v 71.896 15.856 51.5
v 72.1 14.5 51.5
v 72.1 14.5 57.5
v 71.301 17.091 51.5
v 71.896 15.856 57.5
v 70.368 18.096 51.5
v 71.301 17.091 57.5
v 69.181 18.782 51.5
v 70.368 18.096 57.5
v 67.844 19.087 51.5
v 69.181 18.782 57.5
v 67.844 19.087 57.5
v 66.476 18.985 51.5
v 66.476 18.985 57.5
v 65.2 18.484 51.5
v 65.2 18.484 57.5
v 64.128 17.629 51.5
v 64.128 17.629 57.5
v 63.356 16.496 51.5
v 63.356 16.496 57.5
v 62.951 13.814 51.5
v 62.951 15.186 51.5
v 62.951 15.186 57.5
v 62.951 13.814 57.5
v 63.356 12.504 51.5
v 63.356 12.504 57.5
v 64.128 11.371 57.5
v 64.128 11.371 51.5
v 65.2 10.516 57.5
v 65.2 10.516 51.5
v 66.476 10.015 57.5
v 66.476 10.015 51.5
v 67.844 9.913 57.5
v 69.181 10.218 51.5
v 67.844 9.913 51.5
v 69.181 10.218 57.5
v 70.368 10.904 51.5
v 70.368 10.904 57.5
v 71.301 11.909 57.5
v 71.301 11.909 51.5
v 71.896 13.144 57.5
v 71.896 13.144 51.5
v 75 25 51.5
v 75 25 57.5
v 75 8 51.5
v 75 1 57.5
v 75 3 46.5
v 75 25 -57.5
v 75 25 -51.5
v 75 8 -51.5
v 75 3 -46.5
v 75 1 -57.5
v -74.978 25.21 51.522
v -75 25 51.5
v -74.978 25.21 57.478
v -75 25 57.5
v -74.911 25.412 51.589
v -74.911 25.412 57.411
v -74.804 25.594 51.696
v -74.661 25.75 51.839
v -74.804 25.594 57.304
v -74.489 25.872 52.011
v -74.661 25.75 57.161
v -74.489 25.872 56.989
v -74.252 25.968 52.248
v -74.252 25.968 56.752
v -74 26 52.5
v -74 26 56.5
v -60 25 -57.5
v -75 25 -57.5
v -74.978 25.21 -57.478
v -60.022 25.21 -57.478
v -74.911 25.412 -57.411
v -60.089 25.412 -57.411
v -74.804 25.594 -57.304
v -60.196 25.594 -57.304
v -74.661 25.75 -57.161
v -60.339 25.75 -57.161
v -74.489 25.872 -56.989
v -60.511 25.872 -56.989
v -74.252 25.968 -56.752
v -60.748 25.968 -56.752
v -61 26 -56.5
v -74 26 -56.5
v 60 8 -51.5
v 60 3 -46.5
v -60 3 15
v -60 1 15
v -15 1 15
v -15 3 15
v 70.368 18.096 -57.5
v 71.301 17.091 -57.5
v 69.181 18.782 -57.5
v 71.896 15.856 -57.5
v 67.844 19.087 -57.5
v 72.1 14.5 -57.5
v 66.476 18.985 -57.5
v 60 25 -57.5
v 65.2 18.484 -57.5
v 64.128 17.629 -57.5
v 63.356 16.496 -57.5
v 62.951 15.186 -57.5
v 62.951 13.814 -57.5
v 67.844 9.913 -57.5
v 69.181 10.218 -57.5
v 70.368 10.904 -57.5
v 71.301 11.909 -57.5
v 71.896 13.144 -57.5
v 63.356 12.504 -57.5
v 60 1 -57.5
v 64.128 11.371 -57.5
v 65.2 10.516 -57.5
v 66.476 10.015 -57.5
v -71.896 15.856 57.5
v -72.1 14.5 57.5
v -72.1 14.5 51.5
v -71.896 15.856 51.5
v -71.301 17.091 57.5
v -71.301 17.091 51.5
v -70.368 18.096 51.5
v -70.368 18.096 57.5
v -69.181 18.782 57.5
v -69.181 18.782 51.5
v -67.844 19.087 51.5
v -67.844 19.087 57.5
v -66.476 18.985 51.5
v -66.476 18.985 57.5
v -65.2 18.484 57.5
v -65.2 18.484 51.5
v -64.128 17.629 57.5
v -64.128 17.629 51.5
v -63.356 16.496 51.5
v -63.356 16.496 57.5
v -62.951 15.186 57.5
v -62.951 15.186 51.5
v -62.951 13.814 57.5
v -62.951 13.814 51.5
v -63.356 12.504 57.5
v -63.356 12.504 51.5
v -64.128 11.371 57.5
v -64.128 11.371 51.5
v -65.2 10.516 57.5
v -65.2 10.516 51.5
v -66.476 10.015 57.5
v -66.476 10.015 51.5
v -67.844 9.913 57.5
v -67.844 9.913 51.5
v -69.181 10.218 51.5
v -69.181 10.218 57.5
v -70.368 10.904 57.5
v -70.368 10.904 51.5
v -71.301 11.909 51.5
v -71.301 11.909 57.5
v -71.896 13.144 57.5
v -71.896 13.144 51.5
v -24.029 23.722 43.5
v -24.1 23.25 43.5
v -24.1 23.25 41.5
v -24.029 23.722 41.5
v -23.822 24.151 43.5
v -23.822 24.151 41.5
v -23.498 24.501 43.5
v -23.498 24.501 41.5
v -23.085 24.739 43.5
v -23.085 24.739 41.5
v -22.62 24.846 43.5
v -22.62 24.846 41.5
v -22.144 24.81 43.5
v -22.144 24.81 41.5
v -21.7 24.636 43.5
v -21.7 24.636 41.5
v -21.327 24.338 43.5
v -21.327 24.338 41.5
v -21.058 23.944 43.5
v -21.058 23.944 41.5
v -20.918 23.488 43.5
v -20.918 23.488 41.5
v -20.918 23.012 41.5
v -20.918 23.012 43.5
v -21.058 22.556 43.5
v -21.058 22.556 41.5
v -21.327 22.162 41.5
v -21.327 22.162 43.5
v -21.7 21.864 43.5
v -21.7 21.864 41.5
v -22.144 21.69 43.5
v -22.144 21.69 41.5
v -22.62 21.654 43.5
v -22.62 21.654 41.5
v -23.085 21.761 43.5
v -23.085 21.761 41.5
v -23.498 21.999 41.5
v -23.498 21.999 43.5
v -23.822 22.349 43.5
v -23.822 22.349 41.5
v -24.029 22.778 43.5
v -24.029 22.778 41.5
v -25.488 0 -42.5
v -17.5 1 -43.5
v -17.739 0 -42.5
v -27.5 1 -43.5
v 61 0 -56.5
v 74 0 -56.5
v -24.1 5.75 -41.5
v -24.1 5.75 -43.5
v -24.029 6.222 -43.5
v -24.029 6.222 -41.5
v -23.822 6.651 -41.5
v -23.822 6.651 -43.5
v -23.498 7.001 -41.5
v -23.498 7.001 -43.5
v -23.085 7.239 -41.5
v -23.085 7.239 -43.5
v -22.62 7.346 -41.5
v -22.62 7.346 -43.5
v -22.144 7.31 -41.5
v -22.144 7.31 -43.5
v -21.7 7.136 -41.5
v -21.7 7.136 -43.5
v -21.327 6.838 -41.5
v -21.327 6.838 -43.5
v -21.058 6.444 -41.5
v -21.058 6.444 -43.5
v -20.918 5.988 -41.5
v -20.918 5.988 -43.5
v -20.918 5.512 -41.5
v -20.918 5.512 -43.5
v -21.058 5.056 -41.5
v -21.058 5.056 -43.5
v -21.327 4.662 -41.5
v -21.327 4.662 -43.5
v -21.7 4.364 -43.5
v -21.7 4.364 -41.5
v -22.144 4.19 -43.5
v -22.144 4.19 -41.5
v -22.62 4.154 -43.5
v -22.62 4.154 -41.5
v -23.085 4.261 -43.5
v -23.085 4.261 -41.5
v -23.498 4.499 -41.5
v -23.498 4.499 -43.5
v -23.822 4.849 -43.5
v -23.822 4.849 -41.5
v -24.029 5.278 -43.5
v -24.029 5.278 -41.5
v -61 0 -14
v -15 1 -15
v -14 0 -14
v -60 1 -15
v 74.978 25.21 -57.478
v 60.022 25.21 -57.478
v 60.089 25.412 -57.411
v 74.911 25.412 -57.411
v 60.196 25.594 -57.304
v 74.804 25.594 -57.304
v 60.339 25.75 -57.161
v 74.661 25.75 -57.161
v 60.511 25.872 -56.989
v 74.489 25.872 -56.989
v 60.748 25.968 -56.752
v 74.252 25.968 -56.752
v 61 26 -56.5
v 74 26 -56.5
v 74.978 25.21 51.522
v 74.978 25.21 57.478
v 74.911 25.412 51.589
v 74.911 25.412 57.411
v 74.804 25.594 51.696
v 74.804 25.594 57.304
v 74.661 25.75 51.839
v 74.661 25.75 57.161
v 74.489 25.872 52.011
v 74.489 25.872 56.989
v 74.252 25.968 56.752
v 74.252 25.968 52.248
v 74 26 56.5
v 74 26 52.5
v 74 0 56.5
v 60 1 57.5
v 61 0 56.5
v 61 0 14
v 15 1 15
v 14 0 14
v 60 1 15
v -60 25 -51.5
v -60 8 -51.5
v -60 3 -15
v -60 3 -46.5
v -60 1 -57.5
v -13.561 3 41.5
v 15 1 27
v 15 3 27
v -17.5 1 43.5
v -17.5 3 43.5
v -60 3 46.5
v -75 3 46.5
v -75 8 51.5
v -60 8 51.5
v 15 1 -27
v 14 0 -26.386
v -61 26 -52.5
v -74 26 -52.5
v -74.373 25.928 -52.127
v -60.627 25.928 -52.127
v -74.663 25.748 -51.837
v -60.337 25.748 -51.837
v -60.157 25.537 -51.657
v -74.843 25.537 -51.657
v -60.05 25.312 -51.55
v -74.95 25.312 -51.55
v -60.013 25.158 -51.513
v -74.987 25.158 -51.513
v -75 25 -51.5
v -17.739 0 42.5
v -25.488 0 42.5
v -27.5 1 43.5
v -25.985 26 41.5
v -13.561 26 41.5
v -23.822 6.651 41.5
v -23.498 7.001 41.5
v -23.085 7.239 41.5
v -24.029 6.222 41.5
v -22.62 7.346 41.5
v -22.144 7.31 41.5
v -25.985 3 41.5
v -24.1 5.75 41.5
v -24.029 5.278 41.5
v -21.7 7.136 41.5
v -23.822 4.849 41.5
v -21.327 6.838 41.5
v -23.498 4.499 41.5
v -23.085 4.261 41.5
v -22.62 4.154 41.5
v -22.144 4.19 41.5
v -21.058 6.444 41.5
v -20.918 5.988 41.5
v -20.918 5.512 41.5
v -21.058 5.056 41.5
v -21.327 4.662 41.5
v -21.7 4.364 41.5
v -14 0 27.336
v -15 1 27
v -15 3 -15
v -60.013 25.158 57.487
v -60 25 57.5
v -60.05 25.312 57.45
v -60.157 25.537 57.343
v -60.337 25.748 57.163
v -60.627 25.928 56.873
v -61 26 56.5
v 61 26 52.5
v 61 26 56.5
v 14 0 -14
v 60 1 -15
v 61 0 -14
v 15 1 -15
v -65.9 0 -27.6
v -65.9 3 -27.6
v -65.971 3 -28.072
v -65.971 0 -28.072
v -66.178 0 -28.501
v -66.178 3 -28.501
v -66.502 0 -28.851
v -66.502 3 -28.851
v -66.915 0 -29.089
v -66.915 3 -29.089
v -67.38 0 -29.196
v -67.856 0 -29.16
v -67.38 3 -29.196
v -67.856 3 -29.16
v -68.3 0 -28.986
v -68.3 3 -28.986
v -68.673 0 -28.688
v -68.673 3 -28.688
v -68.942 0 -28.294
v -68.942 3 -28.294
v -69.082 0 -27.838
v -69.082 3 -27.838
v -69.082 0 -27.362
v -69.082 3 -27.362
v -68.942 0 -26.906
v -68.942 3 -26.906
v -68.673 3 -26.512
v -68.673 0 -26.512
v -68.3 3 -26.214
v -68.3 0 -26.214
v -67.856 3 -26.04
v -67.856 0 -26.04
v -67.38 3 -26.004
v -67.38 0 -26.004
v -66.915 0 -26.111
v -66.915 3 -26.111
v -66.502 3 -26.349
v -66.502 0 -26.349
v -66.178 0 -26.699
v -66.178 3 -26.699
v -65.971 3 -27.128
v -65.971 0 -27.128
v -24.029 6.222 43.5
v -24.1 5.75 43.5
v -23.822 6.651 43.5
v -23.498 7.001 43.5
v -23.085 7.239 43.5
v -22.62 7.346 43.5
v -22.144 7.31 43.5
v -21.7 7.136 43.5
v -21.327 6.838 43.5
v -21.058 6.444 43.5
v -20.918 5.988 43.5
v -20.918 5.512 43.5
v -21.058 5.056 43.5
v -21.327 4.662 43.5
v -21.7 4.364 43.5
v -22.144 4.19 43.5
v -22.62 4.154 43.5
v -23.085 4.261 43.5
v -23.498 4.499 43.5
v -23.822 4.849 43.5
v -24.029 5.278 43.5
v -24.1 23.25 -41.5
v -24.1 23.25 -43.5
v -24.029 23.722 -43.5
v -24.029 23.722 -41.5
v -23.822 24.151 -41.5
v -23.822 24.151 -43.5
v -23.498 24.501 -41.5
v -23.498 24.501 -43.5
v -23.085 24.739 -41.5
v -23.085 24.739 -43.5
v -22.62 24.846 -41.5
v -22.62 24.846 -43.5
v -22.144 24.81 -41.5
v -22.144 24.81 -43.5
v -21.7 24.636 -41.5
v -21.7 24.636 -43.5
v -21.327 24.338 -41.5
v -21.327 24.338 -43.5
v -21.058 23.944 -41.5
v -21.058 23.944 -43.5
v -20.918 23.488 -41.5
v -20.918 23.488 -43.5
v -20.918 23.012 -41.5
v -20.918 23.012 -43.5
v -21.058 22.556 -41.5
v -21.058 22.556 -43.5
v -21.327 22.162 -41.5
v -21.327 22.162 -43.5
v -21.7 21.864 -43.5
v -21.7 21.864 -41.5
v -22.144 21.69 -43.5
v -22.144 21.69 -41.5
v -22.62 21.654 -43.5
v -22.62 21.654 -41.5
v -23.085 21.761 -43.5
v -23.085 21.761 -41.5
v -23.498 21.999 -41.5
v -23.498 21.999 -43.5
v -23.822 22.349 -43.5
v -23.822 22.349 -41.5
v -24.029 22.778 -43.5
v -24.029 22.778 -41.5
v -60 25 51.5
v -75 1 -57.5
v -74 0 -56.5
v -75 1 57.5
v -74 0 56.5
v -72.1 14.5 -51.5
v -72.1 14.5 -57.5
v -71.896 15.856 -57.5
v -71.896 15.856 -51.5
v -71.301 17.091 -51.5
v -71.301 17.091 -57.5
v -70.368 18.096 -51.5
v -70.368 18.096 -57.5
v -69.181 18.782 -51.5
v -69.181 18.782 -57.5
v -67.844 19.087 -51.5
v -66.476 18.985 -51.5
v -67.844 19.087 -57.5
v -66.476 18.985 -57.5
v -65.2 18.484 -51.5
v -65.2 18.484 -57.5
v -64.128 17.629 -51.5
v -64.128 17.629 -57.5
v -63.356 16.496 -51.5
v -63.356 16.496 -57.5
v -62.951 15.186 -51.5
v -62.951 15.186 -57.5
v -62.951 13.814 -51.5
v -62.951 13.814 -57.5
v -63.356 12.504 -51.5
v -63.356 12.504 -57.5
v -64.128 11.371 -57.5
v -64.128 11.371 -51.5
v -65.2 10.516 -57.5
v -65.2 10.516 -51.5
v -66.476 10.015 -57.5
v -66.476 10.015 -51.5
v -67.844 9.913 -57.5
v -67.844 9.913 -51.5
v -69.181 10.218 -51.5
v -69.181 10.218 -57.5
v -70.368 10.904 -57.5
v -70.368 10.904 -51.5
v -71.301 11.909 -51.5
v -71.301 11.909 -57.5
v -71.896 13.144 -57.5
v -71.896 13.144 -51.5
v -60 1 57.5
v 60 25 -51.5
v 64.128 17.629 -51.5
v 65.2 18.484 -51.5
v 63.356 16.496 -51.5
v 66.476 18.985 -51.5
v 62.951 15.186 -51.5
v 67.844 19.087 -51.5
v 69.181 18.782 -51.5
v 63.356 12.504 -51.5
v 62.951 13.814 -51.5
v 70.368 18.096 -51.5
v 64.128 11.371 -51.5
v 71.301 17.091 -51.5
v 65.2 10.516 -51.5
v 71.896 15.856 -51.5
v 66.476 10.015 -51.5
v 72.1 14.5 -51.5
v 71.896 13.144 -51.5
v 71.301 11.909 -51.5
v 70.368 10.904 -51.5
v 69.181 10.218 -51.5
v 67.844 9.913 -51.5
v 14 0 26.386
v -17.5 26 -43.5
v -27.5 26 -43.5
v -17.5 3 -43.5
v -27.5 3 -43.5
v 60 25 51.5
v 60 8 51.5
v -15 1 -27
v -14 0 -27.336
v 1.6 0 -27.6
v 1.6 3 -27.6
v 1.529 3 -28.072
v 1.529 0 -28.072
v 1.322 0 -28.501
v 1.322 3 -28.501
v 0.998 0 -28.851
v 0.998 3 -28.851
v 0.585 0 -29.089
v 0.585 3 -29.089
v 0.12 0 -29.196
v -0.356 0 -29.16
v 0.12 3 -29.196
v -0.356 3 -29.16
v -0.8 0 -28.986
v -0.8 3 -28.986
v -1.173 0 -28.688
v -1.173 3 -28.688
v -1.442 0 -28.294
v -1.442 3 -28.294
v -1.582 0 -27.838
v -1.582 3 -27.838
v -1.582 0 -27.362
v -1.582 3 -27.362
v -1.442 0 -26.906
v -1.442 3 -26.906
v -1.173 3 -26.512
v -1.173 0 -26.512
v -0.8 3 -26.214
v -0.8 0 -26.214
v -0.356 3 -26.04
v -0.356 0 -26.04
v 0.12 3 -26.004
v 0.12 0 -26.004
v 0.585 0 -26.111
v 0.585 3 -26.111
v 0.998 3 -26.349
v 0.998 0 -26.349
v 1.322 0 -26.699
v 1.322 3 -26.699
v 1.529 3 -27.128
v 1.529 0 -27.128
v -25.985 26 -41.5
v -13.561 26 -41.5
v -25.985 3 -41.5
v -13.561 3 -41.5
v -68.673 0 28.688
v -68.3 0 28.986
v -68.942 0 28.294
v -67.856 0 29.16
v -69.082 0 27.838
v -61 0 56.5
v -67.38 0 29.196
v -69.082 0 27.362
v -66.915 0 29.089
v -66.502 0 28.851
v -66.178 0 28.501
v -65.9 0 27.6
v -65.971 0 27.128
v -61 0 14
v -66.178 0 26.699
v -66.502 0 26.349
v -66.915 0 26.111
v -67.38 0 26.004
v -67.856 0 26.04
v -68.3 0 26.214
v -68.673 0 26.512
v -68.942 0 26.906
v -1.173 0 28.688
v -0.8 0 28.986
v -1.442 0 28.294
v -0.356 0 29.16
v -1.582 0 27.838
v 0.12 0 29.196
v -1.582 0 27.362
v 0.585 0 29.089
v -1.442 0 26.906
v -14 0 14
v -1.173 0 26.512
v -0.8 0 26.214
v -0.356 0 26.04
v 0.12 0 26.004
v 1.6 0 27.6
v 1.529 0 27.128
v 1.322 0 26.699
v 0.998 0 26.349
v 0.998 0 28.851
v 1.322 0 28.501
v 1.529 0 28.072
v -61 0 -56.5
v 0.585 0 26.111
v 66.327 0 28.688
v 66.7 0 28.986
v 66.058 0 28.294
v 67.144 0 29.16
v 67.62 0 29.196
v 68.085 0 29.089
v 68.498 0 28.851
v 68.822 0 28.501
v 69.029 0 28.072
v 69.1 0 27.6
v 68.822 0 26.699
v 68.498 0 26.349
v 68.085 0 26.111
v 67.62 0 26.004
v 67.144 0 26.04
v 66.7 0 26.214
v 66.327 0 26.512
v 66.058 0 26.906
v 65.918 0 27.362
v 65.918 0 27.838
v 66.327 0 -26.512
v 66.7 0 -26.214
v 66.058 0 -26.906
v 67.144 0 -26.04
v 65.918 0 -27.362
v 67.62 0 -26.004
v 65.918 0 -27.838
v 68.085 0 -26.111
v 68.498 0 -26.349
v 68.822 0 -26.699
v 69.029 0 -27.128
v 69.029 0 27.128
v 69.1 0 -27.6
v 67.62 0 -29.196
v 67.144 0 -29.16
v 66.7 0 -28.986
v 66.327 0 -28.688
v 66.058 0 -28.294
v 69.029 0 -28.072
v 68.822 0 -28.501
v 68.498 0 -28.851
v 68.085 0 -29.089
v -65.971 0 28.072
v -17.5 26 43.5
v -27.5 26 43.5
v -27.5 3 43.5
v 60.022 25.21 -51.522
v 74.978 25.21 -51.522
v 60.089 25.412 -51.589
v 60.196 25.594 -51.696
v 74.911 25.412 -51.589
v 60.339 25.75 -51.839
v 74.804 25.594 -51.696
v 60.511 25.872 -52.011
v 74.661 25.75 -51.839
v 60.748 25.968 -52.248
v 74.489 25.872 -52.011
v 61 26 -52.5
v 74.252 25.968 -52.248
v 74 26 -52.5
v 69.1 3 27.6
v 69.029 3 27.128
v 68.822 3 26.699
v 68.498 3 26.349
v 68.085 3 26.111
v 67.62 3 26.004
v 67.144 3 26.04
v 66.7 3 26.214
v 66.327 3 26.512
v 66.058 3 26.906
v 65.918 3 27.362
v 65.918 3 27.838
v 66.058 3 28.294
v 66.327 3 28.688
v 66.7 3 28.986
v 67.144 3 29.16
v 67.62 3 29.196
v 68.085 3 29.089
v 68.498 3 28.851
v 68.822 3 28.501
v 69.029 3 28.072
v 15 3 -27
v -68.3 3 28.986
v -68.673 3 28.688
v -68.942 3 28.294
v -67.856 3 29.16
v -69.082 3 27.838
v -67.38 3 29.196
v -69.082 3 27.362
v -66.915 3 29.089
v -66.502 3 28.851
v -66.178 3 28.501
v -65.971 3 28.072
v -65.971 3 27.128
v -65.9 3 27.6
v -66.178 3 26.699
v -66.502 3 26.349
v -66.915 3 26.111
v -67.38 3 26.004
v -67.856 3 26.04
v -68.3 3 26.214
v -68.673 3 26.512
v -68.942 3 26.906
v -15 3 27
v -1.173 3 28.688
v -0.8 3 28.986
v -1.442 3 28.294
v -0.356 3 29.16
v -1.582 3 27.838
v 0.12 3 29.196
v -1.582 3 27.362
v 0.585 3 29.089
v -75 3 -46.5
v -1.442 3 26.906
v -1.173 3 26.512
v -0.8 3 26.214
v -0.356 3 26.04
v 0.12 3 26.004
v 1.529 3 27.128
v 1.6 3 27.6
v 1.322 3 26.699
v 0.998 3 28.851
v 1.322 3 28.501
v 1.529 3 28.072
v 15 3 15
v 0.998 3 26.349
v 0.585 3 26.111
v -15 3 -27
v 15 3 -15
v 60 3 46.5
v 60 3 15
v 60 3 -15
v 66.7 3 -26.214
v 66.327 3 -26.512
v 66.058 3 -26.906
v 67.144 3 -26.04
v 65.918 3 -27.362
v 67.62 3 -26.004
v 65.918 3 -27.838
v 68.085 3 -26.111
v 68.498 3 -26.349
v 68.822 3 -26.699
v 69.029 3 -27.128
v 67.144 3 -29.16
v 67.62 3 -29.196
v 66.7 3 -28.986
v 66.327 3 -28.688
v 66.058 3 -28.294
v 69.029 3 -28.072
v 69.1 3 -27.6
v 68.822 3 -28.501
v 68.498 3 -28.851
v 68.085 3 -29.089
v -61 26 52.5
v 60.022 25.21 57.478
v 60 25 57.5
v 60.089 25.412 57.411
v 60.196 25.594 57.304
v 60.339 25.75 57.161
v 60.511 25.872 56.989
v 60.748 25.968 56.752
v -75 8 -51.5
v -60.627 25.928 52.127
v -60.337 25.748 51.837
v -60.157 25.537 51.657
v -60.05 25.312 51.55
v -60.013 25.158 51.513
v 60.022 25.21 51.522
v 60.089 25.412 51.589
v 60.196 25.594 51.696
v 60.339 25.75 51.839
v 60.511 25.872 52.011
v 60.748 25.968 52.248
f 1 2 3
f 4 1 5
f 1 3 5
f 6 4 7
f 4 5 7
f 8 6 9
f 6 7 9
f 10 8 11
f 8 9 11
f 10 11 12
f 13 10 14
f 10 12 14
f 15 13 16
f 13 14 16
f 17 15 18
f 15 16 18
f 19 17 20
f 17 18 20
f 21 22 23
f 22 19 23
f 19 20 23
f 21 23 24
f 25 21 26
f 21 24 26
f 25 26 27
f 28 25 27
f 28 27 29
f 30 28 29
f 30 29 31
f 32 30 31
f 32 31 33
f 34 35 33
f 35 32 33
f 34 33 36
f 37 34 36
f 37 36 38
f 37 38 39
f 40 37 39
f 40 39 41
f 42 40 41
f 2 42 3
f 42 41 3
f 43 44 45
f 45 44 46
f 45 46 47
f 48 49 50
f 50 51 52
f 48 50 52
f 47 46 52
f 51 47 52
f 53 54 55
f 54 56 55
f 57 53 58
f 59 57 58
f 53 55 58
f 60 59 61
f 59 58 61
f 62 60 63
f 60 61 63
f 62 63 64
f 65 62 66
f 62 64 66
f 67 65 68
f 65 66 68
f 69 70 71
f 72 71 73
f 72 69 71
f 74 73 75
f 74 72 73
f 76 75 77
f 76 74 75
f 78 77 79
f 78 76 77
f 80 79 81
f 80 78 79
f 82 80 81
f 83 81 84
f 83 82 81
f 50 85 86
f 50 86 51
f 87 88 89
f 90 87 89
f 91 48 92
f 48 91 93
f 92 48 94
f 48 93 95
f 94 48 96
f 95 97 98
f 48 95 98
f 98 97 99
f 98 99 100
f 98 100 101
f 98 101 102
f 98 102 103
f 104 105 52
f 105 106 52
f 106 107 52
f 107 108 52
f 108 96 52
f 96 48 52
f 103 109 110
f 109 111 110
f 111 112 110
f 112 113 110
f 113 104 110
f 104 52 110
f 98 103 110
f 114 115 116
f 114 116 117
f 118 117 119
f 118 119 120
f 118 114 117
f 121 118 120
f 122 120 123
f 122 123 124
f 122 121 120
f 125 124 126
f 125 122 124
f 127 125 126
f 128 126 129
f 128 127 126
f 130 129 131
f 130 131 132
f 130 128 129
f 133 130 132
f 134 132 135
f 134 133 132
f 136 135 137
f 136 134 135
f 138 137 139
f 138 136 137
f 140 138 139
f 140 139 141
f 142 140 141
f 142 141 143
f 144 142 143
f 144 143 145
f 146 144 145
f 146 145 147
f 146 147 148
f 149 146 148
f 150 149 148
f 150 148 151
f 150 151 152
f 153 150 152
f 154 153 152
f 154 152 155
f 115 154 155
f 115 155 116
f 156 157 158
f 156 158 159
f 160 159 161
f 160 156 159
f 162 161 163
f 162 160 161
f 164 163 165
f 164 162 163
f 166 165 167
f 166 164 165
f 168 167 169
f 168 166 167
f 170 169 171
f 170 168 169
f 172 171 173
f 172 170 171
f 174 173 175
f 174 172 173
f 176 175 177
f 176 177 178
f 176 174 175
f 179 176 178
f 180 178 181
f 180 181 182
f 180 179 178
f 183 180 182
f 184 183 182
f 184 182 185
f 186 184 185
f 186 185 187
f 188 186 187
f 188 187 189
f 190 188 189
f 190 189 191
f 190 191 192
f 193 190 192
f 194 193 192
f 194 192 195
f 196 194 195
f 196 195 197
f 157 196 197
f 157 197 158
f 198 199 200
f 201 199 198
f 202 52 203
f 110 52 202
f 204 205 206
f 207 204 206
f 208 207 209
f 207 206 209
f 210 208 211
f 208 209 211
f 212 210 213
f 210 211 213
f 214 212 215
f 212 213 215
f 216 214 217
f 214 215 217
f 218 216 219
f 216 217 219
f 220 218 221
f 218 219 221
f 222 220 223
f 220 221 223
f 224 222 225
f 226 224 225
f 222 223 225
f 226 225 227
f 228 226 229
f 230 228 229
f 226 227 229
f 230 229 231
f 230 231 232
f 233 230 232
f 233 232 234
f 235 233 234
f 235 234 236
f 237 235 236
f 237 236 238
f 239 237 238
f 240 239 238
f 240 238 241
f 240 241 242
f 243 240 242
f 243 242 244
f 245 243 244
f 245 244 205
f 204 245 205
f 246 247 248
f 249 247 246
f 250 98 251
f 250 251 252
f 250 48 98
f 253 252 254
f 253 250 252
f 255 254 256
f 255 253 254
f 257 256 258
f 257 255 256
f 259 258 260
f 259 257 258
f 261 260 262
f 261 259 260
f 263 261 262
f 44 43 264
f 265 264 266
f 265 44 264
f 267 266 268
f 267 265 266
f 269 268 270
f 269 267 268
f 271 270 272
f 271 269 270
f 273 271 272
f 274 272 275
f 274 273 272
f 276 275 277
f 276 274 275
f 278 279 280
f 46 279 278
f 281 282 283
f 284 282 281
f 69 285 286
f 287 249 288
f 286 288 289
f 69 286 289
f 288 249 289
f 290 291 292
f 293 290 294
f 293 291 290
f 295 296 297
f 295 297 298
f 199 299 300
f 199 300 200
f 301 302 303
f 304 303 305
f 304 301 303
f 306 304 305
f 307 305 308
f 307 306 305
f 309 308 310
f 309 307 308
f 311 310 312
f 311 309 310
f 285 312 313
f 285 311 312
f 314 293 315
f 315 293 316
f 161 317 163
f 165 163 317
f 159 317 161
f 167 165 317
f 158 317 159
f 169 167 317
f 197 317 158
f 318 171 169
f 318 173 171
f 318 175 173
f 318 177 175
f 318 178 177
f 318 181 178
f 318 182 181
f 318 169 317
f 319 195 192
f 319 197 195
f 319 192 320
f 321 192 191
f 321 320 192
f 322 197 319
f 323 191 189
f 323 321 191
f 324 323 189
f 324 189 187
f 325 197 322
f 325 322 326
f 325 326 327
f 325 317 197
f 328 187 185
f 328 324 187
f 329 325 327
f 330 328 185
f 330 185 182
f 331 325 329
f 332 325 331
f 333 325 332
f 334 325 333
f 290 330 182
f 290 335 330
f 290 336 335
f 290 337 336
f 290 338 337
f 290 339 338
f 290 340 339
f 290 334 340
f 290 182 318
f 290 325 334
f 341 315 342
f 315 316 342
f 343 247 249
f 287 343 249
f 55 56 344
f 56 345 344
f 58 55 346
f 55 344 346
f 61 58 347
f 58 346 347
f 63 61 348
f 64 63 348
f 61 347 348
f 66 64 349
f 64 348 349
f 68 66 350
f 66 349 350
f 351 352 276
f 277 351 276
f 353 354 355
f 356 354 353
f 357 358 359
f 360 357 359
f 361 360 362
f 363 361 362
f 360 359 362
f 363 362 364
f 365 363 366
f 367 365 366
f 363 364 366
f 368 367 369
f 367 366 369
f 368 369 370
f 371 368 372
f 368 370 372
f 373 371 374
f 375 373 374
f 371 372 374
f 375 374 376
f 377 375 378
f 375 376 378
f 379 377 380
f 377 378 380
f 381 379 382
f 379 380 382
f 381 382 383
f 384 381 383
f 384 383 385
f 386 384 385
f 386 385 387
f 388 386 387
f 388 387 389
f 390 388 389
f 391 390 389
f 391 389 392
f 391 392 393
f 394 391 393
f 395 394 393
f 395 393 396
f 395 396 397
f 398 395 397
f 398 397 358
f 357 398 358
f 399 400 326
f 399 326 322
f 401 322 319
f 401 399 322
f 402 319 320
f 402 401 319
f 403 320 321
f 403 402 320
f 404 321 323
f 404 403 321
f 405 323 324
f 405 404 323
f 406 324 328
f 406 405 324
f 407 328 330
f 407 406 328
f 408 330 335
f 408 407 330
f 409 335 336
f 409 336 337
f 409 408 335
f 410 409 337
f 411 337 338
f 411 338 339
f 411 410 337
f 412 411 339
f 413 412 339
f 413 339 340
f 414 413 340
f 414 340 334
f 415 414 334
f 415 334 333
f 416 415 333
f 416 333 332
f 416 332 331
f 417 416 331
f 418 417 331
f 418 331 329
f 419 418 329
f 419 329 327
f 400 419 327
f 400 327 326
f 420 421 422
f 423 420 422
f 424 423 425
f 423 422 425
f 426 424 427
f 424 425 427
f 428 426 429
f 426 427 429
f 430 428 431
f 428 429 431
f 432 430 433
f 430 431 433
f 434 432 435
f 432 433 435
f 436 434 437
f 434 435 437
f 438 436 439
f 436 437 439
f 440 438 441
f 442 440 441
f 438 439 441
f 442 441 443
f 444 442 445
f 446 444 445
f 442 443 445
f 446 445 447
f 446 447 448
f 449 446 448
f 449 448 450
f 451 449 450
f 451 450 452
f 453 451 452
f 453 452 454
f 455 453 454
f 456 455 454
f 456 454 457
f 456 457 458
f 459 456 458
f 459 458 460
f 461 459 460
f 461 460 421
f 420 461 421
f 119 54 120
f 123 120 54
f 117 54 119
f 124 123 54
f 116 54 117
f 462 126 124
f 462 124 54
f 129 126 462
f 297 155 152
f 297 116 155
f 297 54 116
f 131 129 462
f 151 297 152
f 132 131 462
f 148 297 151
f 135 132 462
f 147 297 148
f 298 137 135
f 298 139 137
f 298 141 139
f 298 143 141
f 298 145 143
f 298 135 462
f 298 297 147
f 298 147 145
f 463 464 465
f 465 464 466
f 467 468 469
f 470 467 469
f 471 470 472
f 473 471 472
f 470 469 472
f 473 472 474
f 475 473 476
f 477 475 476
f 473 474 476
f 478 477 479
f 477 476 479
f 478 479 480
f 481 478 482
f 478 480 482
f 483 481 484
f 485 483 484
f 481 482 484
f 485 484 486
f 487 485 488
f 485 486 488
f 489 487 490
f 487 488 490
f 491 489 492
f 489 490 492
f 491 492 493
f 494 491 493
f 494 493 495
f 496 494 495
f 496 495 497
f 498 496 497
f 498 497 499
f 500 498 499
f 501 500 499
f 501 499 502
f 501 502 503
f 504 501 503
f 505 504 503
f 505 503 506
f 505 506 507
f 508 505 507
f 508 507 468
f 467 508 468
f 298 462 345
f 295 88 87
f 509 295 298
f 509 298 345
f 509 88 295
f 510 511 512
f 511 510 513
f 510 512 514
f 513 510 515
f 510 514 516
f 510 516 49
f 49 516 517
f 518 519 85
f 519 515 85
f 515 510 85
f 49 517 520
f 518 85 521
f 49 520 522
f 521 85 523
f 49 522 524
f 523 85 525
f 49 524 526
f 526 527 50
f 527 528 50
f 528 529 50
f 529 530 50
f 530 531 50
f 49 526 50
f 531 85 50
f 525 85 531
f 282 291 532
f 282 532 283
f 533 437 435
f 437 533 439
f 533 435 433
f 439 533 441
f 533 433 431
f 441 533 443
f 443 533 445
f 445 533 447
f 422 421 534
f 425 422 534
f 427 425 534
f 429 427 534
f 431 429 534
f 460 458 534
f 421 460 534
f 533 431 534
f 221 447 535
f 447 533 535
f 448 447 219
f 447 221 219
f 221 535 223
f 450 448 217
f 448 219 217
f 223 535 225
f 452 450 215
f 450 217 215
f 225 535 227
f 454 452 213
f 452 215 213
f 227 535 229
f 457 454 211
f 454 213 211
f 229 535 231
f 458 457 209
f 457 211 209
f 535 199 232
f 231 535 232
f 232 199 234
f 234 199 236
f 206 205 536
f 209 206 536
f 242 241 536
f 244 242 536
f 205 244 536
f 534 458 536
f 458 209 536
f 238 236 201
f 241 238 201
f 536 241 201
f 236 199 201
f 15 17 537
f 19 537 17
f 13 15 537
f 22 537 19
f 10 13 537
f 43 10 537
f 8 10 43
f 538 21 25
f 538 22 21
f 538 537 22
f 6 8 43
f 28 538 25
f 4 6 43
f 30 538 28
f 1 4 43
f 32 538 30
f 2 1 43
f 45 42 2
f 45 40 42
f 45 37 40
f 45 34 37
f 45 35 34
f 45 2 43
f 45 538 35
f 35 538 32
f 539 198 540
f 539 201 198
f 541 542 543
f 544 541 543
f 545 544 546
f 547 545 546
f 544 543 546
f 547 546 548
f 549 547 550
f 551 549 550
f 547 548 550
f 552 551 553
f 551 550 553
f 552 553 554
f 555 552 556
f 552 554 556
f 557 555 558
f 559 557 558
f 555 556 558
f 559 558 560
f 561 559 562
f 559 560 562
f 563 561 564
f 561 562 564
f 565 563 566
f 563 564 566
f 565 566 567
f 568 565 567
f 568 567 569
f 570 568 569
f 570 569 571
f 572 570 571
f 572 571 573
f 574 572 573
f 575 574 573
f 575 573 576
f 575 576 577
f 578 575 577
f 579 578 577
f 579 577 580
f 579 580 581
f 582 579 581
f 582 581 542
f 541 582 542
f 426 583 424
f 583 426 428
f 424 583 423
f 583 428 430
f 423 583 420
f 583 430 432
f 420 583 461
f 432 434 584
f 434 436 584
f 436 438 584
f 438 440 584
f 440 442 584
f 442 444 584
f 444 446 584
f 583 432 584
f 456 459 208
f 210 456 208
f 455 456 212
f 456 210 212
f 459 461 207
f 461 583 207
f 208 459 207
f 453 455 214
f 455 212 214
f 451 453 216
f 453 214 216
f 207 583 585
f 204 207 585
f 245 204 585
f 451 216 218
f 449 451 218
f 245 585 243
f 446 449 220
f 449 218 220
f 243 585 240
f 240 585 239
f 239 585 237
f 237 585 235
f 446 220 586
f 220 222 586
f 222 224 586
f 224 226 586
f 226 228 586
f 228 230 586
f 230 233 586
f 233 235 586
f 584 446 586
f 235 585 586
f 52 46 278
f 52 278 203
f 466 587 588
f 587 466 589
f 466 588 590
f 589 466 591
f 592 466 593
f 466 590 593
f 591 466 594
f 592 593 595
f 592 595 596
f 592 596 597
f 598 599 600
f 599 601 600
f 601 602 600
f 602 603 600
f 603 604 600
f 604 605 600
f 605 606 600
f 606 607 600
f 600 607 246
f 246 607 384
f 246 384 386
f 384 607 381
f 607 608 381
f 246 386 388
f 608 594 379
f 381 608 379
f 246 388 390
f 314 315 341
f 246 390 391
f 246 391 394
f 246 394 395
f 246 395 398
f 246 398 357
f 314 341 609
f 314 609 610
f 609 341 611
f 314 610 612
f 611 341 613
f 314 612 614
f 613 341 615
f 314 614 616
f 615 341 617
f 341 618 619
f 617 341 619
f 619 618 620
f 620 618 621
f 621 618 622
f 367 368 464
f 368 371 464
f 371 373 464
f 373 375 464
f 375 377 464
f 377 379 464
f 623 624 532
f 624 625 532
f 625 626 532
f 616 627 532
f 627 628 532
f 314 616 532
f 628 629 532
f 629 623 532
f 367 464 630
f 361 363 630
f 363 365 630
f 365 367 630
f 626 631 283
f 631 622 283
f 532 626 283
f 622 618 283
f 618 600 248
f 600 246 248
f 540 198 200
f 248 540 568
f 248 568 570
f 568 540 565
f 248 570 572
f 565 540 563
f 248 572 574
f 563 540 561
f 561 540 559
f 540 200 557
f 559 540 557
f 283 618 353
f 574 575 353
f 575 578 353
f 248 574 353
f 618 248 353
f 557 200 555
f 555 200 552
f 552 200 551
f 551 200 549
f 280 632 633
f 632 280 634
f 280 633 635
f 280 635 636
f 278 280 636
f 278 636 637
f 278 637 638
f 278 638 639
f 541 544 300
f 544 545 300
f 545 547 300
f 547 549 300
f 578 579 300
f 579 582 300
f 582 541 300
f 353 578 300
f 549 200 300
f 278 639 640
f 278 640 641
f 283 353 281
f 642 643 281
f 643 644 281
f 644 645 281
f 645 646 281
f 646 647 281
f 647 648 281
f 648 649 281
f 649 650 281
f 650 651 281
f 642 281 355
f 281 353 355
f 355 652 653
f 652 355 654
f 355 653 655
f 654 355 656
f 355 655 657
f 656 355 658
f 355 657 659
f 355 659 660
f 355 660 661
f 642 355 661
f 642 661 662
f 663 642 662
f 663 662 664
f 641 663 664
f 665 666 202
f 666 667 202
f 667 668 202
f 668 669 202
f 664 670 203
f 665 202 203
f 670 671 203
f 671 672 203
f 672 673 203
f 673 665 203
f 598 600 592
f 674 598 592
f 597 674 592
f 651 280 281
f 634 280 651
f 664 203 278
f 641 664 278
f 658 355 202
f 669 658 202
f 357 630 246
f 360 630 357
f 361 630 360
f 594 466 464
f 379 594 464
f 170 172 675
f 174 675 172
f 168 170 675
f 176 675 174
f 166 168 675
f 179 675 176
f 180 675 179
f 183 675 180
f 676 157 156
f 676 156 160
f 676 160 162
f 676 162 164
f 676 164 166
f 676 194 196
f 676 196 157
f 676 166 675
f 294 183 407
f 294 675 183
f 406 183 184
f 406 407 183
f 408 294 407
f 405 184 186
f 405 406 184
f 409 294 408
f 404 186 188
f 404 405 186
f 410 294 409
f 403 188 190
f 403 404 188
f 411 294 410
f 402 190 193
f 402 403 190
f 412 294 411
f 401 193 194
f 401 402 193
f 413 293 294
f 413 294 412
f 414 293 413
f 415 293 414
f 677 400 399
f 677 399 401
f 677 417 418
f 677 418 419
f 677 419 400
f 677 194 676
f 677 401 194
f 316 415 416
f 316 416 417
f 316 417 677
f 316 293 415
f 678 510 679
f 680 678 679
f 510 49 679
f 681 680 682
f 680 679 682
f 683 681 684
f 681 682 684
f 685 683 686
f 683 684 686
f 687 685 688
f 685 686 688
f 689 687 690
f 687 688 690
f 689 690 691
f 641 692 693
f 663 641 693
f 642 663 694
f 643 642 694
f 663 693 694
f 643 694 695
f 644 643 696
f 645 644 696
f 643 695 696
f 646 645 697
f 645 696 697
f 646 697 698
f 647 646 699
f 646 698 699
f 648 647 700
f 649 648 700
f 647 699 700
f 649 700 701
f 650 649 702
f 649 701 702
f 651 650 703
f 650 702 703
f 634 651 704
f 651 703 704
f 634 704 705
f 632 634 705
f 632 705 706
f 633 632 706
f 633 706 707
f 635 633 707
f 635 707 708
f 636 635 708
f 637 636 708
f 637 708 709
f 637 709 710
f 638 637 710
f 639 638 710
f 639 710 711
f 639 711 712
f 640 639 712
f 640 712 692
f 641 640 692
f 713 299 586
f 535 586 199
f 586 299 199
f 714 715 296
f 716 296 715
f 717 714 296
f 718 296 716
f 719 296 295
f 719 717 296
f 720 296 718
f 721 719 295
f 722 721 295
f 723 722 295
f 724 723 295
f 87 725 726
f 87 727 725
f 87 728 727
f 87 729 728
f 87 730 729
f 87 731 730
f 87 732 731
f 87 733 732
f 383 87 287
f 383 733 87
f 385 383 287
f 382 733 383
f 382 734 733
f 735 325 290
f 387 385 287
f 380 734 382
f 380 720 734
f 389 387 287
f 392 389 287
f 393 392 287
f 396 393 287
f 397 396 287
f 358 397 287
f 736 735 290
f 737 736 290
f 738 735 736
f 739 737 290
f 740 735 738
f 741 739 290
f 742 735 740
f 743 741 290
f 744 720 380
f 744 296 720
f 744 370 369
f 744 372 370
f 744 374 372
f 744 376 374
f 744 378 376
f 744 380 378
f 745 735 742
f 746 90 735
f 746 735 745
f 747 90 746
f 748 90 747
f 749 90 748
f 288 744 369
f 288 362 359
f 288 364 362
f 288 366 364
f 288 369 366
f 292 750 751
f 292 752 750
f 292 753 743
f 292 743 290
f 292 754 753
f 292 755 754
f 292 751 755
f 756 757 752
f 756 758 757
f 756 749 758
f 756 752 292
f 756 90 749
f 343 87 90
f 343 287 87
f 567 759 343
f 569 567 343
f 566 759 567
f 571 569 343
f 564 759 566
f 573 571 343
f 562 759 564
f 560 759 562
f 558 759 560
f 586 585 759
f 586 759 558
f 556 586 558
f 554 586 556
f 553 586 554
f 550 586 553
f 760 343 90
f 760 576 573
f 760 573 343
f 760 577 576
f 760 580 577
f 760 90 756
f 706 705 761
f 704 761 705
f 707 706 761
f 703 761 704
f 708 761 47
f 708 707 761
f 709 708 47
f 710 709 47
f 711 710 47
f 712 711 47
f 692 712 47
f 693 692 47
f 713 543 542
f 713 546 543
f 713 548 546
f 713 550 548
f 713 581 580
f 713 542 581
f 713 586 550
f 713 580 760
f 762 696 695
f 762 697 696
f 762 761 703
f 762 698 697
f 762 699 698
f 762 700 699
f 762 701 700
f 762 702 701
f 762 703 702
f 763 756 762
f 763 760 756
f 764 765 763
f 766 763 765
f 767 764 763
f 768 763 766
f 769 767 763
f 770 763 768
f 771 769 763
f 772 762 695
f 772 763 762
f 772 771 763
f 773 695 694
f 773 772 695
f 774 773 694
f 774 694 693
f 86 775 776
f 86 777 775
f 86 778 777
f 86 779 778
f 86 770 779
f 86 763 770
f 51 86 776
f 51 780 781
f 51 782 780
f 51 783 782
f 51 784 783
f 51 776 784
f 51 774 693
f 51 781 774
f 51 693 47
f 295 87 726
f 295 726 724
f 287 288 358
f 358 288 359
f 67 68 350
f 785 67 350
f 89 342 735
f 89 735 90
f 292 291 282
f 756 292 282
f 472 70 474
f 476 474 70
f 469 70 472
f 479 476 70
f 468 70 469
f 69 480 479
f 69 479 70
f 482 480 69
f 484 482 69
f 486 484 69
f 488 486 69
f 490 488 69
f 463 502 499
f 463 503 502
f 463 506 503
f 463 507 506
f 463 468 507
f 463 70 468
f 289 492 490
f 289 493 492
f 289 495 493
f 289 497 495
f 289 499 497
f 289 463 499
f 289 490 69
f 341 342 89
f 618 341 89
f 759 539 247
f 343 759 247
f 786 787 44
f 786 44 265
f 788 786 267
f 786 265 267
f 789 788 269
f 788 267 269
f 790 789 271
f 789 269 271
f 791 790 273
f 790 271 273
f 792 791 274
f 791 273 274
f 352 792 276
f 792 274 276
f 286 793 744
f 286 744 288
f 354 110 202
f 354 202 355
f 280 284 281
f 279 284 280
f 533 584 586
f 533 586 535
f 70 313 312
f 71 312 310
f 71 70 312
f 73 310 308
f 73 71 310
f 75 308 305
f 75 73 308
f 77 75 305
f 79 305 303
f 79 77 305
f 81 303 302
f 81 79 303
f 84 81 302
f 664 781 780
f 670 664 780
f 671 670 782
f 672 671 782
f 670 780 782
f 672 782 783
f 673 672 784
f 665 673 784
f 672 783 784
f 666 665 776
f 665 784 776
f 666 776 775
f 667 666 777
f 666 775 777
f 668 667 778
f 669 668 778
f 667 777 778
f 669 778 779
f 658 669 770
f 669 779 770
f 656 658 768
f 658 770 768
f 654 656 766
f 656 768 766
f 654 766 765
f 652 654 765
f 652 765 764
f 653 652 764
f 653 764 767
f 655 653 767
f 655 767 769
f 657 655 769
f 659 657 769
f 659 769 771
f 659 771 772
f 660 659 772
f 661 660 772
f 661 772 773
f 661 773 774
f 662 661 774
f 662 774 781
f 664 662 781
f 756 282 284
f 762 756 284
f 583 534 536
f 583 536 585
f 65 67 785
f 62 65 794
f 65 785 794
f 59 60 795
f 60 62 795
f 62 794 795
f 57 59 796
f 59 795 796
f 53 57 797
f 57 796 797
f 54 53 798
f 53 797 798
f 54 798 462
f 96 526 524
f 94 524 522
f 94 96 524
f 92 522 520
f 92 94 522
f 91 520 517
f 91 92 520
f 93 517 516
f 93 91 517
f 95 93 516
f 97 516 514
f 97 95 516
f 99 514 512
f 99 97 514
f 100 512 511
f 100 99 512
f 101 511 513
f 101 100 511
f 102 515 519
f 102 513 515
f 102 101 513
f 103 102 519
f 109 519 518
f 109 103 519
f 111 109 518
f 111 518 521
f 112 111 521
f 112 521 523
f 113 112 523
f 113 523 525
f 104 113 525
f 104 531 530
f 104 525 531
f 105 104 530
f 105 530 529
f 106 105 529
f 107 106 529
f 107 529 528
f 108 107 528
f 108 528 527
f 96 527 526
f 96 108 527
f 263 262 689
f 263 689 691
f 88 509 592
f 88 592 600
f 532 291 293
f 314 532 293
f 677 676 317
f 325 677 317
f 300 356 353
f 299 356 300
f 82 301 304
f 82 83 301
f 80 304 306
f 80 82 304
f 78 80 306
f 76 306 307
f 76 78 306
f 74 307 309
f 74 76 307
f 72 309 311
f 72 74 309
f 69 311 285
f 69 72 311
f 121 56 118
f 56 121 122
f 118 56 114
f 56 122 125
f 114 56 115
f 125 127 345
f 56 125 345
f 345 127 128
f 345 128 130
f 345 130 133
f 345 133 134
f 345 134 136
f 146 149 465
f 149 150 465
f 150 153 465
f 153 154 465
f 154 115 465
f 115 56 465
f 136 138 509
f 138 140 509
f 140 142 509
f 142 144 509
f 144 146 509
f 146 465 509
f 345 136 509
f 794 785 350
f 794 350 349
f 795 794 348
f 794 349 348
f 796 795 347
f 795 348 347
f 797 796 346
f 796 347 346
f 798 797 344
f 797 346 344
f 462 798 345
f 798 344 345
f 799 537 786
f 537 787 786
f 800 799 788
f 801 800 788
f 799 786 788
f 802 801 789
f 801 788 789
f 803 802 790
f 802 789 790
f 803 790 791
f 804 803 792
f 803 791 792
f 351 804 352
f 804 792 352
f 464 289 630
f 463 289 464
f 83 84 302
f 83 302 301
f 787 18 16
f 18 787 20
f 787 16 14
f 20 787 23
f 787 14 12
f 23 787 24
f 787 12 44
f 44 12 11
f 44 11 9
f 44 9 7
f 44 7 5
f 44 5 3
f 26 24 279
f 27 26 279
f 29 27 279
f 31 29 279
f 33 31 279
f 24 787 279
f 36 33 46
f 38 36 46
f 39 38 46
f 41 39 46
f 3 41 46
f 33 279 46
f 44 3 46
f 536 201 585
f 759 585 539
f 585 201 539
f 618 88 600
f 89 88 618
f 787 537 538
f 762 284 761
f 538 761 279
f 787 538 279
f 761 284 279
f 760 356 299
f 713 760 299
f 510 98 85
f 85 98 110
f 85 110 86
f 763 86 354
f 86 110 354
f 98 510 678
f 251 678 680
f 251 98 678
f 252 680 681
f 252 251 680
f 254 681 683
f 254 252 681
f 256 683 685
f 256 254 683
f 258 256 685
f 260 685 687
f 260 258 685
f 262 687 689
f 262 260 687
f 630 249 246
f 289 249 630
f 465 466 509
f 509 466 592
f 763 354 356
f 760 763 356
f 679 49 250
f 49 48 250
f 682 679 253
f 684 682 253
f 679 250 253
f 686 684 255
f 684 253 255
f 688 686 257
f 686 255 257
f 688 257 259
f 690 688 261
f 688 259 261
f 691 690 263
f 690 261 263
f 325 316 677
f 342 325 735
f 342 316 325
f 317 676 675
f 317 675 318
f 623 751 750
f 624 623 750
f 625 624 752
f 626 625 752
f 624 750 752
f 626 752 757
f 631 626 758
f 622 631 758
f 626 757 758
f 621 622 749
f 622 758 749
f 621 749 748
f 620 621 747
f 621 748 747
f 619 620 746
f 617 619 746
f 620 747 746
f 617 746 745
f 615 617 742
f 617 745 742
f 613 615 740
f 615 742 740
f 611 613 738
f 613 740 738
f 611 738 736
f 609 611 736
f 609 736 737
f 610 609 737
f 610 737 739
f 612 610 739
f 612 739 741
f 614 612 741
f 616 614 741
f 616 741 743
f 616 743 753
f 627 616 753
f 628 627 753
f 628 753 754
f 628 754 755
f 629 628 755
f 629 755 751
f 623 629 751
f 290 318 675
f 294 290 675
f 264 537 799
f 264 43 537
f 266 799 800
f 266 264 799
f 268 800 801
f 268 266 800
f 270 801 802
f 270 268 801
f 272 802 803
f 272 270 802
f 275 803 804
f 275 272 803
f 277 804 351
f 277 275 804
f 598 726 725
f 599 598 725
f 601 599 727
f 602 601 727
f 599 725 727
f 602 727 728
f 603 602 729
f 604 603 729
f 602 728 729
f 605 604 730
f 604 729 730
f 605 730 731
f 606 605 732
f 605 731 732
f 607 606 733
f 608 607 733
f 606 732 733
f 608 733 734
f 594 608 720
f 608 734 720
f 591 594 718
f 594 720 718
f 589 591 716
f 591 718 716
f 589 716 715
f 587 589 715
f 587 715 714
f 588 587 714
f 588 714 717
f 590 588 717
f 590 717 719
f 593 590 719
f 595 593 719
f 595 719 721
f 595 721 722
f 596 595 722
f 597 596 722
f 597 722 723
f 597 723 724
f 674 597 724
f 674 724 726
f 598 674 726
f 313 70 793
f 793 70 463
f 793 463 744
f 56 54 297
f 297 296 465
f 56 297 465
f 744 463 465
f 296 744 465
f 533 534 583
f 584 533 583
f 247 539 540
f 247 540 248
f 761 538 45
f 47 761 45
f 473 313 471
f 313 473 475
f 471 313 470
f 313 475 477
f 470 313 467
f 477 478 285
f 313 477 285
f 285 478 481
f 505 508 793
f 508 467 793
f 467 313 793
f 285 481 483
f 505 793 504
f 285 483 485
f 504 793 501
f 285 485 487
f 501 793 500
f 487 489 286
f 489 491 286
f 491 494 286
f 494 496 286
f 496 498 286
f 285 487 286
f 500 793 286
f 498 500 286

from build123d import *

# Parameters (mm, degrees)
SKETCH2_W           = 15
SKETCH2_H           = 30.5
SKETCH2_W_2         = 7.5
SKETCH2_H_2         = 30
SKETCH2_W_3         = 45
SKETCH2_W_4         = 30
SKETCH2_H_3         = 12
BOSS_EXTRUDE1_DEPTH = 3
SKETCH3_W           = 15
SKETCH3_H           = 6
BOSS_EXTRUDE2_DEPTH = 23
SKETCH4_R           = 1.6
CUT_EXTRUDE1_DEPTH  = 23
SKETCH5_R           = 4.6
CUT_EXTRUDE2_DEPTH  = 23
SKETCH6_R           = 1.6
CUT_EXTRUDE3_DEPTH  = 23
CHAMFER1_SIZE       = 1
FILLET1_R           = 1
CHAMFER2_SIZE       = 5


with BuildPart() as part:
    # Sketch2 → Boss-Extrude1 (new body)
    with BuildSketch(Plane(origin=(0, 0, 0), x_dir=(1, 0, 0), z_dir=(0, 1, 0))):
        with Locations((-67.5, -42.25)):
            Rectangle(SKETCH2_W, SKETCH2_H)
        Polygon((-60, 57.5), (-75, 57.5), (-75, -27), (-60, -27), (-60, -15), (-67.5, -15), (-67.5, 15), (-60, 15), (-60, 27), align=None)
        with Locations((-63.75, 0)):
            Rectangle(SKETCH2_W_2, SKETCH2_H_2)
        with Locations((-37.5, 0)):
            Rectangle(SKETCH2_W_3, SKETCH2_H_2)
        Rectangle(SKETCH2_W_4, SKETCH2_H_2)
        Polygon((-15, 27), (-15, 15), (15, 15), (15, 27), (-17.5, 43.5), (-27.5, 43.5), align=None)
        Polygon((-27.5, -43.5), (-15, -27), (15, -27), (-17.5, -43.5), align=None)
        with Locations((0, -21)):
            Rectangle(SKETCH2_W_4, SKETCH2_H_3)
        with Locations((37.5, 0)):
            Rectangle(SKETCH2_W_3, SKETCH2_H_2)
        with Locations((63.75, 0)):
            Rectangle(SKETCH2_W_2, SKETCH2_H_2)
        Polygon((60, 27), (60, 15), (67.5, 15), (67.5, -15), (60, -15), (60, -27), (75, -27), (75, 57.5), (60, 57.5), align=None)
        with Locations((67.5, -42.25)):
            Rectangle(SKETCH2_W, SKETCH2_H)
    extrude(amount=BOSS_EXTRUDE1_DEPTH)

    # Sketch3 → Boss-Extrude2 (add)
    with BuildSketch(Plane(origin=(0, 3, 0), x_dir=(1, 0, 0), z_dir=(0, 1, 0))):
        with Locations((-67.5, 54.5)):
            Rectangle(SKETCH3_W, SKETCH3_H)
        Polygon((-17.5, 43.5), (-27.5, 43.5), (-25.984848485, 41.5), (-13.560606061, 41.5), align=None)
        with Locations((67.5, 54.5)):
            Rectangle(SKETCH3_W, SKETCH3_H)
    extrude(amount=BOSS_EXTRUDE2_DEPTH)

    # Sketch4 → Cut-Extrude1 (cut)
    with BuildSketch(Plane(origin=(0, 0, -43.5), x_dir=(-1, 0, 0), z_dir=(0, 0, -1))):
        with Locations((22.5, 23.25)):
            Circle(SKETCH4_R)
        with Locations((22.5, 5.75)):
            Circle(SKETCH4_R)
    extrude(amount=-CUT_EXTRUDE1_DEPTH, mode=Mode.SUBTRACT)

    # Sketch5 → Cut-Extrude2 (cut)
    with BuildSketch(Plane(origin=(0, 0, -57.5), x_dir=(-1, 0, 0), z_dir=(0, 0, -1))):
        with Locations((67.5, 14.5)):
            Circle(SKETCH5_R)
    cut_extrude2 = extrude(amount=-CUT_EXTRUDE2_DEPTH, mode=Mode.SUBTRACT)

    # Mirror3: Cut-Extrude2 across plane
    add(cut_extrude2.mirror(Plane(origin=(0, 0, 0), x_dir=(0, 0, 1), z_dir=(1, 0, 0))), mode=Mode.SUBTRACT)

    # Mirror4: part across plane


with BuildPart() as part_1:
    add(part.part)
    add(part.part.mirror(Plane.XY))

    # Sketch6 → Cut-Extrude3 (cut)
    with BuildSketch(Plane(origin=(0, 3, 0), x_dir=(1, 0, 0), z_dir=(0, 1, 0))):
        with Locations((-67.5, 27.6)):
            Circle(SKETCH6_R)
        with Locations((0, 27.6)):
            Circle(SKETCH6_R)
        with Locations((67.5, 27.6)):
            Circle(SKETCH6_R)
        with Locations((67.5, -27.6)):
            Circle(SKETCH6_R)
        with Locations((0, -27.6)):
            Circle(SKETCH6_R)
        with Locations((-67.5, -27.6)):
            Circle(SKETCH6_R)
    extrude(amount=-CUT_EXTRUDE3_DEPTH, mode=Mode.SUBTRACT)

    # Chamfer1
    chamfer1_edges = [part_1.edges().sort_by_distance(p)[0] for p in [
        (-67.5, 0, 57.5),
        (-75, 0, 0),
        (-67.5, 0, -57.5),
        (-60, 0, -36.25),
        (-37.5, 0, -15),
        (-15, 0, -21),
        (-21.25, 0, -35.25),
        (-22.5, 0, -43.5),
        (-1.25, 0, -35.25),
        (15, 0, -21),
        (37.5, 0, -15),
        (60, 0, -36.25),
        (67.5, 0, -57.5),
        (75, 0, 0),
        (67.5, 0, 57.5),
        (60, 0, 36.25),
        (37.5, 0, 15),
        (15, 0, 21),
        (-1.25, 0, 35.25),
        (-22.5, 0, 43.5),
        (-21.25, 0, 35.25),
        (-15, 0, 21),
        (-37.5, 0, 15),
        (-60, 0, 36.25),
    ]]
    chamfer(chamfer1_edges, length=CHAMFER1_SIZE)

    # Fillet1
    fillet1_edges = [part_1.edges().sort_by_distance(p)[0] for p in [
        (60, 26, 54.5),
        (75, 26, 54.5),
        (67.5, 26, 51.5),
        (67.5, 26, 57.5),
        (75, 26, -54.5),
        (60, 26, -54.5),
        (67.5, 26, -51.5),
        (67.5, 26, -57.5),
        (-67.5, 26, -57.5),
        (-60, 26, -54.5),
        (-67.5, 26, -51.5),
        (-75, 26, -54.5),
        (-75, 26, 54.5),
        (-60, 26, 54.5),
        (-67.5, 26, 51.5),
        (-67.5, 26, 57.5),
    ]]
    fillet(fillet1_edges, radius=FILLET1_R)

    # Chamfer2
    chamfer2_edges = [part_1.edges().sort_by_distance(p)[0] for p in [
        (-67.5, 3, 51.5),
        (67.5, 3, 51.5),
        (67.5, 3, -51.5),
        (-67.5, 3, -51.5),
    ]]
    chamfer(chamfer2_edges, length=CHAMFER2_SIZE)


solid = part_1.part
